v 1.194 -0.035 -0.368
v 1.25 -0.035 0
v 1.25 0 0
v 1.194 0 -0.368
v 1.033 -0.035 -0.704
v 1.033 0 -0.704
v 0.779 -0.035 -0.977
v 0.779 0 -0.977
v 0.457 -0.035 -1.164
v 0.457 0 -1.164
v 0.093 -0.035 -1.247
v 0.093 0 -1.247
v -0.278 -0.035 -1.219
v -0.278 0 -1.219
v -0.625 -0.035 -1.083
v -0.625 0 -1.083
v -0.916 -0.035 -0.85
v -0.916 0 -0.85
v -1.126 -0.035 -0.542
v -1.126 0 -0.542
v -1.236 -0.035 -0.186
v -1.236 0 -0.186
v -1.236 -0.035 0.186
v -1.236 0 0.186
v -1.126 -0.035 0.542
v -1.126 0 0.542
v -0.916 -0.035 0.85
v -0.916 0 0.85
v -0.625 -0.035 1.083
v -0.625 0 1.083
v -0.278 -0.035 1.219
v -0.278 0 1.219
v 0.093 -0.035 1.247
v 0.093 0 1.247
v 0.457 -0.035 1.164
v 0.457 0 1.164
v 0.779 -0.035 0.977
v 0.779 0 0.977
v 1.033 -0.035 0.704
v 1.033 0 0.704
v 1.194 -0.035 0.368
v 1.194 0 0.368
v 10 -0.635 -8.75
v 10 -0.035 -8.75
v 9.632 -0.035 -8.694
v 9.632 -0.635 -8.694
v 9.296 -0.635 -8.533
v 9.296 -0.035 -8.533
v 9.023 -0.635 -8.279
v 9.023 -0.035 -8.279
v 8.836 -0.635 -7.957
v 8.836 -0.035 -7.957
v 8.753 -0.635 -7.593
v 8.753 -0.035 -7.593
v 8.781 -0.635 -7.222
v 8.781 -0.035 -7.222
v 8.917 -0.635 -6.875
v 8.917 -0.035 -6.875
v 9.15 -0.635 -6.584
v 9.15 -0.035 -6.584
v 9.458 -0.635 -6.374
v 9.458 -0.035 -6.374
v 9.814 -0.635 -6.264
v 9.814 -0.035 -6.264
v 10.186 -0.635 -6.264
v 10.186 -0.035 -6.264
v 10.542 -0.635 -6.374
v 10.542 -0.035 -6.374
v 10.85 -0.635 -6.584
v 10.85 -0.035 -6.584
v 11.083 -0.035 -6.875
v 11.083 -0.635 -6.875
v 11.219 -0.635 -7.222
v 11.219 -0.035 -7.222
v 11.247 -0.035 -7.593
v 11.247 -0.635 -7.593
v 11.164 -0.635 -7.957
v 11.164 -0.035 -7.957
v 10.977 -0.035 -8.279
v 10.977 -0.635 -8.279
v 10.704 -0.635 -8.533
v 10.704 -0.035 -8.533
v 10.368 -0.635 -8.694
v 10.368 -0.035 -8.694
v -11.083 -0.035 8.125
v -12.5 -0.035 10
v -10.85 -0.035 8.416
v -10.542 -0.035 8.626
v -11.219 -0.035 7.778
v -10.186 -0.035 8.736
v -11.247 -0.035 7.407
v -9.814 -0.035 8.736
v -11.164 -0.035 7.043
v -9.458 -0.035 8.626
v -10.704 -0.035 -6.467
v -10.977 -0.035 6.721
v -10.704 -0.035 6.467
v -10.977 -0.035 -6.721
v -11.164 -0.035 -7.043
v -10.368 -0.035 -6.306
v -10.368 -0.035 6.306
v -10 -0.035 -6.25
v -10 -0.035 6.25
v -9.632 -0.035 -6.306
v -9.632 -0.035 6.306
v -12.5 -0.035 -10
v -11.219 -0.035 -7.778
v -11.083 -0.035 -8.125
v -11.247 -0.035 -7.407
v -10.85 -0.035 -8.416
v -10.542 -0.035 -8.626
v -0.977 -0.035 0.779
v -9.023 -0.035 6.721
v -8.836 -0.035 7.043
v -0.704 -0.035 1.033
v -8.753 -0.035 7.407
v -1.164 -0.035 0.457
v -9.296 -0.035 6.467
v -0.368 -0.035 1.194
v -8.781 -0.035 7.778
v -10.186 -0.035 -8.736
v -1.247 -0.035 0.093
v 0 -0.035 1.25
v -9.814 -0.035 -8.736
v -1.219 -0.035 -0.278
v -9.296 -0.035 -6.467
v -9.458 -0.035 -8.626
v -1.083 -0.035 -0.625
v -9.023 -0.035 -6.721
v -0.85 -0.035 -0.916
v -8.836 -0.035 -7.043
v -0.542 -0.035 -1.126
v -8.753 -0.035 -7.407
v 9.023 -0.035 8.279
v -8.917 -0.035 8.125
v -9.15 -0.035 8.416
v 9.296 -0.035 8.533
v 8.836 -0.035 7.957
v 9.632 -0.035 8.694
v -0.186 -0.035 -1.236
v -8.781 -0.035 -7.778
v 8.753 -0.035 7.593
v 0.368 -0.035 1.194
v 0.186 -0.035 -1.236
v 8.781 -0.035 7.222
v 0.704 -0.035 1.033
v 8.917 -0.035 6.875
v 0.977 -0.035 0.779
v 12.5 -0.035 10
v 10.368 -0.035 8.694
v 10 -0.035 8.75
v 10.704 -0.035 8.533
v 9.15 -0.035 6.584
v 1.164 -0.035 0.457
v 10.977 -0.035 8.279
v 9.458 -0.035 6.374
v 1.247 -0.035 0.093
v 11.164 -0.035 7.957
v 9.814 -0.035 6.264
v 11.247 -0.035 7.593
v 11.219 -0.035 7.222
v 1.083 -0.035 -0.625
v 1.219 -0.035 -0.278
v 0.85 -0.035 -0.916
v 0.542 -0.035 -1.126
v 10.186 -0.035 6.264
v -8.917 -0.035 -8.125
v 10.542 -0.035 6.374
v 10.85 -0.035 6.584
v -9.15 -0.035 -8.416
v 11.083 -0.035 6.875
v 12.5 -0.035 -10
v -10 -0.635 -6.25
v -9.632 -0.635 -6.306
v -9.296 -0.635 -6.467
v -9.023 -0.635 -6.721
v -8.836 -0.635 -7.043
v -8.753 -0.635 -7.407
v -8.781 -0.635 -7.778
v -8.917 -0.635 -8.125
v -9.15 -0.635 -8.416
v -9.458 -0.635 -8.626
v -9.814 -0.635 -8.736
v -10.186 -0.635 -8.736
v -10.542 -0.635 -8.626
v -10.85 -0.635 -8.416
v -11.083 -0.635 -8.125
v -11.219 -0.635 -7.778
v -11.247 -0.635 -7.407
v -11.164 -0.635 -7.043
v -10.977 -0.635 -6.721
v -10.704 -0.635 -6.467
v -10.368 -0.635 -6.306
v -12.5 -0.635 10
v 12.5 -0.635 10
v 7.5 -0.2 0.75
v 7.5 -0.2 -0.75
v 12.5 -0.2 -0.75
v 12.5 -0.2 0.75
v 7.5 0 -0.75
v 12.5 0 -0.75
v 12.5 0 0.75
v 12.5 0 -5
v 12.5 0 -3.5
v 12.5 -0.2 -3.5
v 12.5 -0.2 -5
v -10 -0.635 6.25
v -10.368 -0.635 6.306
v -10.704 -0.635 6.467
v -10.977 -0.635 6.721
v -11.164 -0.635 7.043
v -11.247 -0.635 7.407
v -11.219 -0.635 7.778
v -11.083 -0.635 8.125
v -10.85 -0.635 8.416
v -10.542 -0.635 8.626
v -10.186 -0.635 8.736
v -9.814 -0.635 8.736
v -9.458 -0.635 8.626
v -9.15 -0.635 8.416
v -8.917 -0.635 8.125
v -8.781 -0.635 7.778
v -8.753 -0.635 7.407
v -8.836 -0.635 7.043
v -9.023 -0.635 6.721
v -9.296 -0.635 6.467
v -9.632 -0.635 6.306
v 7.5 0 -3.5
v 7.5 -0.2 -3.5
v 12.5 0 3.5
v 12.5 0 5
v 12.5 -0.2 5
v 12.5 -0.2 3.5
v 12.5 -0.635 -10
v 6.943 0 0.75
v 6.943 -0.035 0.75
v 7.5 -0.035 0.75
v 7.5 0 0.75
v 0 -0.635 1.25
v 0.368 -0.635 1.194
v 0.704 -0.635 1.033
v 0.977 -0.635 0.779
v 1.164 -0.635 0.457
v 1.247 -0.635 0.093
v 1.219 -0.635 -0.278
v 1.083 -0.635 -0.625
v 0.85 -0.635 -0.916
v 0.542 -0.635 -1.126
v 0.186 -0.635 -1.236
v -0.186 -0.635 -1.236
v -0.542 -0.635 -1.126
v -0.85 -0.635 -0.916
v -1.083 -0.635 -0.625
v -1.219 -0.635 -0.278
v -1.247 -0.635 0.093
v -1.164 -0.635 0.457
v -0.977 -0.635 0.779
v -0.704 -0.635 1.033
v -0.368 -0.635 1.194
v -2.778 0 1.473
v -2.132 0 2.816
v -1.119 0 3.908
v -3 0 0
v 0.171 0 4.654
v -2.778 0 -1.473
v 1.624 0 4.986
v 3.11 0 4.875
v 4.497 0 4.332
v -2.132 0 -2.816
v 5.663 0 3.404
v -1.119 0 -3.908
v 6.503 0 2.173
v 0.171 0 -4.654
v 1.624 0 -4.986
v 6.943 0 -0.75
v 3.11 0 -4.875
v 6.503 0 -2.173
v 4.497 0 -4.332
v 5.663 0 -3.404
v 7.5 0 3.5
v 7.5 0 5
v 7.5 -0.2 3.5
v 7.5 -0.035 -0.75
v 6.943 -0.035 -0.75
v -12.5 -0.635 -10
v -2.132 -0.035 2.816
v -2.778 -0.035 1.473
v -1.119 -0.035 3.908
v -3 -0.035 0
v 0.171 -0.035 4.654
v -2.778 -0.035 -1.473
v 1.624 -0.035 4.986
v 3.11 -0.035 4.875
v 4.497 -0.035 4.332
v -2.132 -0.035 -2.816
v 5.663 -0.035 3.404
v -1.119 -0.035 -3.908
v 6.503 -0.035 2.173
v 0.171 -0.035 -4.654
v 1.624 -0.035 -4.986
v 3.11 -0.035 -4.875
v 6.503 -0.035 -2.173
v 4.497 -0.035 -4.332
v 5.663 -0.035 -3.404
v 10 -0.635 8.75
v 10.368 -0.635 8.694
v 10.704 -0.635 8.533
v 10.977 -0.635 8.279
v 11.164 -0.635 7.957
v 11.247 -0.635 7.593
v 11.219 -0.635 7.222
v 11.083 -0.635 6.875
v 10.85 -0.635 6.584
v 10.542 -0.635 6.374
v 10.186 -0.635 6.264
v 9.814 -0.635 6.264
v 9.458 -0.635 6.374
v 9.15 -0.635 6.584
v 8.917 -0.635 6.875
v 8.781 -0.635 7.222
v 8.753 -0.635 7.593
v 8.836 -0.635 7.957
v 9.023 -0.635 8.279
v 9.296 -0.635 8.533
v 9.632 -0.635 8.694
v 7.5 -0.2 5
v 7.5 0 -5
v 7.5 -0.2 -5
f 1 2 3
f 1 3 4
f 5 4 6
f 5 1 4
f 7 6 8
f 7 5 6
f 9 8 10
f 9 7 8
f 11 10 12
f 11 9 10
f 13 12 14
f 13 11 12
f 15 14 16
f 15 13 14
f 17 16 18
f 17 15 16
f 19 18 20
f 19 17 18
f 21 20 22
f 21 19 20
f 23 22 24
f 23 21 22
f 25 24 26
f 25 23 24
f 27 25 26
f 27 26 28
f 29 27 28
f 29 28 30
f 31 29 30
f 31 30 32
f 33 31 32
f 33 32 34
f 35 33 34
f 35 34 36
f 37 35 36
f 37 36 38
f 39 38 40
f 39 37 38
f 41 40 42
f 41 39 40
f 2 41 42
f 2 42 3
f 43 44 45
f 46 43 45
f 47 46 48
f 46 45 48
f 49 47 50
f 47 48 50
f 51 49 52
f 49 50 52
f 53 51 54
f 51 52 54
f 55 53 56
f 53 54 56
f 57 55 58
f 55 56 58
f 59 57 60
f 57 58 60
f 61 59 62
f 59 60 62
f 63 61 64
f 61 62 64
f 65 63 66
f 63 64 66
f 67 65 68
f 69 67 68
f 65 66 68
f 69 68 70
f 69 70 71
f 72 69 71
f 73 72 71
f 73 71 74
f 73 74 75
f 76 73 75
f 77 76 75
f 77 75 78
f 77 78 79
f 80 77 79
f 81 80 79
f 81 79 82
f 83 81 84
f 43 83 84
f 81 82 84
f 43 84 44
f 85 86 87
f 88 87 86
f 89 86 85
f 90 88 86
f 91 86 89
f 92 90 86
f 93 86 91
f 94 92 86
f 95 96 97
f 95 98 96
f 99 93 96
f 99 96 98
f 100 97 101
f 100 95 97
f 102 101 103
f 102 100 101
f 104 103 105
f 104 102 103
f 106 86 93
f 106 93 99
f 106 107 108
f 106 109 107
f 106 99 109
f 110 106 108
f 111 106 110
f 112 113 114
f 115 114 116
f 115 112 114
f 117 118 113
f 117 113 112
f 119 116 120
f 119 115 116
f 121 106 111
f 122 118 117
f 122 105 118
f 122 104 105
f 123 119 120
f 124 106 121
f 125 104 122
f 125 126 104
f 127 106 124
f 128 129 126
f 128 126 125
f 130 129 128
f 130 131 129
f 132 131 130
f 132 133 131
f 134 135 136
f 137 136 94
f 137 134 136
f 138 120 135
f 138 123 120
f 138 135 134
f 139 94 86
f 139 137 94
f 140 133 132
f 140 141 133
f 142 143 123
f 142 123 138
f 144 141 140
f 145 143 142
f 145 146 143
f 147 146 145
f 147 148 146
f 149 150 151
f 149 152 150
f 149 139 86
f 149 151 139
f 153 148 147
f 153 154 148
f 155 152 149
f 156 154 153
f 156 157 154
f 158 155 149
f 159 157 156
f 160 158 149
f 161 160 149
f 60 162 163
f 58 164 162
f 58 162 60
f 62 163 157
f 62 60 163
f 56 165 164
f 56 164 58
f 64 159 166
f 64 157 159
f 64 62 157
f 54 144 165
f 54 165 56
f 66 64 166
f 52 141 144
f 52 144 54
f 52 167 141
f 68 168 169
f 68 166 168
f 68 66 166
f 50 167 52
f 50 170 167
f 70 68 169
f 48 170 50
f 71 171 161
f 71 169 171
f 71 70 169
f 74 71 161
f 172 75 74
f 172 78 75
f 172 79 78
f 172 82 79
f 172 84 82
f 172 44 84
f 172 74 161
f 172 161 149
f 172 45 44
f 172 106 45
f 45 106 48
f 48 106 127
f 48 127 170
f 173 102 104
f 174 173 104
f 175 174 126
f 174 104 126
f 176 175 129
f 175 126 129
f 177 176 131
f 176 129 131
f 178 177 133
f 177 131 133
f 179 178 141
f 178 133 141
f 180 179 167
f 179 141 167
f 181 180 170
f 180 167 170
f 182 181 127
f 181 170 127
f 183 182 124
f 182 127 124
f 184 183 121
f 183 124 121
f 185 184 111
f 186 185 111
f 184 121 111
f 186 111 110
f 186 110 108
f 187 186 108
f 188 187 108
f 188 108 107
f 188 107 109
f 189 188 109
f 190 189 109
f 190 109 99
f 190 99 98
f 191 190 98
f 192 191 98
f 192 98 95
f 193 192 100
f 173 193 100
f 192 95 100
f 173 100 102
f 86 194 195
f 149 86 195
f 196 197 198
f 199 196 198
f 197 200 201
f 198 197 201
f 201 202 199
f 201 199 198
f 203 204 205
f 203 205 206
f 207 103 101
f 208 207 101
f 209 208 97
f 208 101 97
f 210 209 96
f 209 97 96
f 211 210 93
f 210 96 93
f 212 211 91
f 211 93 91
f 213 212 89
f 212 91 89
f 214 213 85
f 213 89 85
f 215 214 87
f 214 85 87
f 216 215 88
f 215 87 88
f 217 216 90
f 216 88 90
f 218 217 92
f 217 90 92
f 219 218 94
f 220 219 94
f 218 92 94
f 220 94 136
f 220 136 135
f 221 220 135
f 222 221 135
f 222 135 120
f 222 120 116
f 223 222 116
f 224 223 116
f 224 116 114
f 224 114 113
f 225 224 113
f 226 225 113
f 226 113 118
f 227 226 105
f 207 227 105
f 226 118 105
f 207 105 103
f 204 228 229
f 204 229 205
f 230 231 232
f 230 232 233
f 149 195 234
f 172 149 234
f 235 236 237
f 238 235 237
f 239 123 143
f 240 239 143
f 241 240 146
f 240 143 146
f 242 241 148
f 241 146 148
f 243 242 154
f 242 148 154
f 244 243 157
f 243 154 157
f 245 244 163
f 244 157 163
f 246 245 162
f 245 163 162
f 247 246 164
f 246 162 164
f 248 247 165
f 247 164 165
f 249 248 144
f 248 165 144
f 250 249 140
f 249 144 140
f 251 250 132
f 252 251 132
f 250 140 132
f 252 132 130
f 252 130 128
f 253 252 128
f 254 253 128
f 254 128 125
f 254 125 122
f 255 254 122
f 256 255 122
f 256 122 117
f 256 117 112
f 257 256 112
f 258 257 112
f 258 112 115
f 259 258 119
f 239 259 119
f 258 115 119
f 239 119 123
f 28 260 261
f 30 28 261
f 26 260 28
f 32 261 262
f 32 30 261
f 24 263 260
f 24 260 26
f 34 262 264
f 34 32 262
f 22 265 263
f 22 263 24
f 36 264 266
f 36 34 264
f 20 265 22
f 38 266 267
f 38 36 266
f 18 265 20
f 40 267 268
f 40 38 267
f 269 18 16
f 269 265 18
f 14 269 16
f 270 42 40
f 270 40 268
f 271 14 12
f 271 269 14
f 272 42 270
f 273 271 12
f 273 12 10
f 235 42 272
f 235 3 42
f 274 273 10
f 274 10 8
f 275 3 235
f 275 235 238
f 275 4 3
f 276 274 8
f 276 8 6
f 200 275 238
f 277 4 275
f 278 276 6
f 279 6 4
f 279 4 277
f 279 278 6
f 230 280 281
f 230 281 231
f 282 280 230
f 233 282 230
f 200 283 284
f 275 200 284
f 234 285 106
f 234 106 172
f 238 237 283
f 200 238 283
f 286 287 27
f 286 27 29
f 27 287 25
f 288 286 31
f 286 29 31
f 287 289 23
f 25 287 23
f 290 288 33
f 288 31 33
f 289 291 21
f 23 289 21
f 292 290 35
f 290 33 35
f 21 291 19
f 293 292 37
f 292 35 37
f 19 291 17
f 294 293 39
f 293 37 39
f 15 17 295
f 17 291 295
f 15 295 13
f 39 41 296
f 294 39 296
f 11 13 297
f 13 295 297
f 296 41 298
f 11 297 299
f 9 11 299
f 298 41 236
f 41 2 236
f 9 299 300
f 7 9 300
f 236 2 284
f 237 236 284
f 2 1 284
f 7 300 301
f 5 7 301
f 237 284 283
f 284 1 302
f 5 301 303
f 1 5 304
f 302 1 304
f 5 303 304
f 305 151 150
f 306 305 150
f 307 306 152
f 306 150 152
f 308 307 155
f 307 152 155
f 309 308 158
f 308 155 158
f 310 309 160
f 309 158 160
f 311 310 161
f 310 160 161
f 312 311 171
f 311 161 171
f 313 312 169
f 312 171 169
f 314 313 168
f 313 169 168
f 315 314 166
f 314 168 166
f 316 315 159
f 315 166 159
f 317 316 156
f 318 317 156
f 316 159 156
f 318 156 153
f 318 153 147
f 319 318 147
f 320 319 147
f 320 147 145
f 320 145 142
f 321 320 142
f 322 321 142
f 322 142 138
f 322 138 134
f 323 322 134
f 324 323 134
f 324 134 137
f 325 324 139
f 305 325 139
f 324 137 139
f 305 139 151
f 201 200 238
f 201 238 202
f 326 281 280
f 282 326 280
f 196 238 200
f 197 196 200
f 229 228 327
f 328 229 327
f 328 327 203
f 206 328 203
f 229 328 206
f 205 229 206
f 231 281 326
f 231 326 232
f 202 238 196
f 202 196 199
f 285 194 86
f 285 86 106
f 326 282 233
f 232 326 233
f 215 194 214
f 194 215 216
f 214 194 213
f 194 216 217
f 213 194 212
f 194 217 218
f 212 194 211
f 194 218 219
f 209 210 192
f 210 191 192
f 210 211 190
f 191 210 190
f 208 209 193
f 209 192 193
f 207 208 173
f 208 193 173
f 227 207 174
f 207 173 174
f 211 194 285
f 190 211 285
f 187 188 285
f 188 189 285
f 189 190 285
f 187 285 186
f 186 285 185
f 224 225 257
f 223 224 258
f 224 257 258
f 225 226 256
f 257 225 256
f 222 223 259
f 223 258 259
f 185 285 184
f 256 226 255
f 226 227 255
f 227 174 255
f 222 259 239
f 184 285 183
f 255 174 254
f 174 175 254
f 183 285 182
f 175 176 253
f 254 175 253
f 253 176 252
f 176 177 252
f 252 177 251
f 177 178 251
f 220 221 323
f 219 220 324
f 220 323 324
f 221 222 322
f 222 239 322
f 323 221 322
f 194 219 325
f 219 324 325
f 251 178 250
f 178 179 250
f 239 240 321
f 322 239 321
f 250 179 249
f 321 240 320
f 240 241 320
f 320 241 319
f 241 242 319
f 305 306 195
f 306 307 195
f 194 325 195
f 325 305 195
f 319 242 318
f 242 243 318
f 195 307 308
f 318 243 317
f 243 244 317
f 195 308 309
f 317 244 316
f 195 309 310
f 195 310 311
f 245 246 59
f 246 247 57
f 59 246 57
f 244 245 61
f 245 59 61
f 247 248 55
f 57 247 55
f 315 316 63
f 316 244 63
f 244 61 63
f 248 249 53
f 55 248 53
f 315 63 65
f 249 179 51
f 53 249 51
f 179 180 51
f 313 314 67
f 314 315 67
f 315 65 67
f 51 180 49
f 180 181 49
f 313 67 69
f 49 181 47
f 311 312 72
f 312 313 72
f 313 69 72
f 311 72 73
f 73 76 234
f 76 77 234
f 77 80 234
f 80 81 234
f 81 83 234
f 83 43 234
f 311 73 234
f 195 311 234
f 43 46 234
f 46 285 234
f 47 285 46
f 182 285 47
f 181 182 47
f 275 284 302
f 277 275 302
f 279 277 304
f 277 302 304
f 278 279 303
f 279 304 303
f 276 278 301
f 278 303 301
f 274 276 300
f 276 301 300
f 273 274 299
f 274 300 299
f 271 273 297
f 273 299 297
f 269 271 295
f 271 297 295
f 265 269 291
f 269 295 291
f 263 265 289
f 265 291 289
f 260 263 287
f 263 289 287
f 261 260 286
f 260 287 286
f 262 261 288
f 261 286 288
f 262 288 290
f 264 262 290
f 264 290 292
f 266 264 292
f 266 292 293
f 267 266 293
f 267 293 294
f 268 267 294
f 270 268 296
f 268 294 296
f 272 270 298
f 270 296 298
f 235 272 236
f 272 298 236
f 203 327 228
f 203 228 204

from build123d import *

# Parameters (mm, degrees)
BOSS_EXTRUDE1_START   = -0.635
SKETCH1_W             = 25
SKETCH1_H             = 20
BOSS_EXTRUDE1_DEPTH   = 0.6
SKETCH2_R             = 1.25
CUT_EXTRUDE1_DEPTH    = 0.6
BOSS_EXTRUDE2_START   = 0.035
SKETCH9_W             = 5
SKETCH9_H             = 1.5
BOSS_EXTRUDE2_DEPTH   = 0.2
BOSS_EXTRUDE2_2_DEPTH = 0.2
BOSS_EXTRUDE2_3_DEPTH = 0.2
SKETCH8_R             = 1.25
BOSS_EXTRUDE3_DEPTH   = 0.035


with BuildPart() as part:
    # Sketch1 → Boss-Extrude1 (new body)
    with BuildSketch(Plane(origin=(0, 0, 0), x_dir=(1, 0, 0), z_dir=(0, 1, 0)).offset(BOSS_EXTRUDE1_START)):
        Rectangle(SKETCH1_W, SKETCH1_H)
    extrude(amount=BOSS_EXTRUDE1_DEPTH)

    # Sketch2 → Cut-Extrude1 (cut)
    with BuildSketch(Plane(origin=(0, -0.035, 0), x_dir=(1, 0, 0), z_dir=(0, 1, 0))):
        with Locations((-10, 7.5)):
            Circle(SKETCH2_R)
        with Locations((10, 7.5)):
            Circle(SKETCH2_R)
        with Locations((10, -7.5)):
            Circle(SKETCH2_R)
        with Locations((-10, -7.5)):
            Circle(SKETCH2_R)
        Circle(SKETCH2_R)
    extrude(amount=-CUT_EXTRUDE1_DEPTH, mode=Mode.SUBTRACT)


with BuildPart() as body_2:
    # Sketch9 → Boss-Extrude2 (new body)
    with BuildSketch(Plane(origin=(0, -0.035, 0), x_dir=(1, 0, 0), z_dir=(0, 1, 0)).offset(BOSS_EXTRUDE2_START)):
        with Locations((10, 4.25)):
            Rectangle(SKETCH9_W, SKETCH9_H)
    extrude(amount=-BOSS_EXTRUDE2_DEPTH)


with BuildPart() as body_3:
    # Sketch9 → Boss-Extrude2 2 (new body)
    with BuildSketch(Plane(origin=(0, -0.035, 0), x_dir=(1, 0, 0), z_dir=(0, 1, 0)).offset(BOSS_EXTRUDE2_START)):
        with Locations((10, 0)):
            Rectangle(SKETCH9_W, SKETCH9_H)
    extrude(amount=-BOSS_EXTRUDE2_2_DEPTH)


with BuildPart() as body_4:
    # Sketch9 → Boss-Extrude2 3 (new body)
    with BuildSketch(Plane(origin=(0, -0.035, 0), x_dir=(1, 0, 0), z_dir=(0, 1, 0)).offset(BOSS_EXTRUDE2_START)):
        with Locations((10, -4.25)):
            Rectangle(SKETCH9_W, SKETCH9_H)
    extrude(amount=-BOSS_EXTRUDE2_3_DEPTH)


with BuildPart() as body_5:
    # Sketch8 → Boss-Extrude3 (new body)
    with BuildSketch(Plane(origin=(0, -0.035, 0), x_dir=(1, 0, 0), z_dir=(0, 1, 0))):
        with BuildLine():
            Line((7.5, 0.75), (6.943429983, 0.75))
            ThreePointArc((6.943429983, 0.75), (-3, 0), (6.943429983, -0.75))
            Line((6.943429983, -0.75), (7.5, -0.75))
            Line((7.5, -0.75), (7.5, 0.75))
        make_face()
        Circle(SKETCH8_R, mode=Mode.SUBTRACT)
    extrude(amount=BOSS_EXTRUDE3_DEPTH)


solid = Compound([part.part, body_2.part, body_3.part, body_4.part, body_5.part])
